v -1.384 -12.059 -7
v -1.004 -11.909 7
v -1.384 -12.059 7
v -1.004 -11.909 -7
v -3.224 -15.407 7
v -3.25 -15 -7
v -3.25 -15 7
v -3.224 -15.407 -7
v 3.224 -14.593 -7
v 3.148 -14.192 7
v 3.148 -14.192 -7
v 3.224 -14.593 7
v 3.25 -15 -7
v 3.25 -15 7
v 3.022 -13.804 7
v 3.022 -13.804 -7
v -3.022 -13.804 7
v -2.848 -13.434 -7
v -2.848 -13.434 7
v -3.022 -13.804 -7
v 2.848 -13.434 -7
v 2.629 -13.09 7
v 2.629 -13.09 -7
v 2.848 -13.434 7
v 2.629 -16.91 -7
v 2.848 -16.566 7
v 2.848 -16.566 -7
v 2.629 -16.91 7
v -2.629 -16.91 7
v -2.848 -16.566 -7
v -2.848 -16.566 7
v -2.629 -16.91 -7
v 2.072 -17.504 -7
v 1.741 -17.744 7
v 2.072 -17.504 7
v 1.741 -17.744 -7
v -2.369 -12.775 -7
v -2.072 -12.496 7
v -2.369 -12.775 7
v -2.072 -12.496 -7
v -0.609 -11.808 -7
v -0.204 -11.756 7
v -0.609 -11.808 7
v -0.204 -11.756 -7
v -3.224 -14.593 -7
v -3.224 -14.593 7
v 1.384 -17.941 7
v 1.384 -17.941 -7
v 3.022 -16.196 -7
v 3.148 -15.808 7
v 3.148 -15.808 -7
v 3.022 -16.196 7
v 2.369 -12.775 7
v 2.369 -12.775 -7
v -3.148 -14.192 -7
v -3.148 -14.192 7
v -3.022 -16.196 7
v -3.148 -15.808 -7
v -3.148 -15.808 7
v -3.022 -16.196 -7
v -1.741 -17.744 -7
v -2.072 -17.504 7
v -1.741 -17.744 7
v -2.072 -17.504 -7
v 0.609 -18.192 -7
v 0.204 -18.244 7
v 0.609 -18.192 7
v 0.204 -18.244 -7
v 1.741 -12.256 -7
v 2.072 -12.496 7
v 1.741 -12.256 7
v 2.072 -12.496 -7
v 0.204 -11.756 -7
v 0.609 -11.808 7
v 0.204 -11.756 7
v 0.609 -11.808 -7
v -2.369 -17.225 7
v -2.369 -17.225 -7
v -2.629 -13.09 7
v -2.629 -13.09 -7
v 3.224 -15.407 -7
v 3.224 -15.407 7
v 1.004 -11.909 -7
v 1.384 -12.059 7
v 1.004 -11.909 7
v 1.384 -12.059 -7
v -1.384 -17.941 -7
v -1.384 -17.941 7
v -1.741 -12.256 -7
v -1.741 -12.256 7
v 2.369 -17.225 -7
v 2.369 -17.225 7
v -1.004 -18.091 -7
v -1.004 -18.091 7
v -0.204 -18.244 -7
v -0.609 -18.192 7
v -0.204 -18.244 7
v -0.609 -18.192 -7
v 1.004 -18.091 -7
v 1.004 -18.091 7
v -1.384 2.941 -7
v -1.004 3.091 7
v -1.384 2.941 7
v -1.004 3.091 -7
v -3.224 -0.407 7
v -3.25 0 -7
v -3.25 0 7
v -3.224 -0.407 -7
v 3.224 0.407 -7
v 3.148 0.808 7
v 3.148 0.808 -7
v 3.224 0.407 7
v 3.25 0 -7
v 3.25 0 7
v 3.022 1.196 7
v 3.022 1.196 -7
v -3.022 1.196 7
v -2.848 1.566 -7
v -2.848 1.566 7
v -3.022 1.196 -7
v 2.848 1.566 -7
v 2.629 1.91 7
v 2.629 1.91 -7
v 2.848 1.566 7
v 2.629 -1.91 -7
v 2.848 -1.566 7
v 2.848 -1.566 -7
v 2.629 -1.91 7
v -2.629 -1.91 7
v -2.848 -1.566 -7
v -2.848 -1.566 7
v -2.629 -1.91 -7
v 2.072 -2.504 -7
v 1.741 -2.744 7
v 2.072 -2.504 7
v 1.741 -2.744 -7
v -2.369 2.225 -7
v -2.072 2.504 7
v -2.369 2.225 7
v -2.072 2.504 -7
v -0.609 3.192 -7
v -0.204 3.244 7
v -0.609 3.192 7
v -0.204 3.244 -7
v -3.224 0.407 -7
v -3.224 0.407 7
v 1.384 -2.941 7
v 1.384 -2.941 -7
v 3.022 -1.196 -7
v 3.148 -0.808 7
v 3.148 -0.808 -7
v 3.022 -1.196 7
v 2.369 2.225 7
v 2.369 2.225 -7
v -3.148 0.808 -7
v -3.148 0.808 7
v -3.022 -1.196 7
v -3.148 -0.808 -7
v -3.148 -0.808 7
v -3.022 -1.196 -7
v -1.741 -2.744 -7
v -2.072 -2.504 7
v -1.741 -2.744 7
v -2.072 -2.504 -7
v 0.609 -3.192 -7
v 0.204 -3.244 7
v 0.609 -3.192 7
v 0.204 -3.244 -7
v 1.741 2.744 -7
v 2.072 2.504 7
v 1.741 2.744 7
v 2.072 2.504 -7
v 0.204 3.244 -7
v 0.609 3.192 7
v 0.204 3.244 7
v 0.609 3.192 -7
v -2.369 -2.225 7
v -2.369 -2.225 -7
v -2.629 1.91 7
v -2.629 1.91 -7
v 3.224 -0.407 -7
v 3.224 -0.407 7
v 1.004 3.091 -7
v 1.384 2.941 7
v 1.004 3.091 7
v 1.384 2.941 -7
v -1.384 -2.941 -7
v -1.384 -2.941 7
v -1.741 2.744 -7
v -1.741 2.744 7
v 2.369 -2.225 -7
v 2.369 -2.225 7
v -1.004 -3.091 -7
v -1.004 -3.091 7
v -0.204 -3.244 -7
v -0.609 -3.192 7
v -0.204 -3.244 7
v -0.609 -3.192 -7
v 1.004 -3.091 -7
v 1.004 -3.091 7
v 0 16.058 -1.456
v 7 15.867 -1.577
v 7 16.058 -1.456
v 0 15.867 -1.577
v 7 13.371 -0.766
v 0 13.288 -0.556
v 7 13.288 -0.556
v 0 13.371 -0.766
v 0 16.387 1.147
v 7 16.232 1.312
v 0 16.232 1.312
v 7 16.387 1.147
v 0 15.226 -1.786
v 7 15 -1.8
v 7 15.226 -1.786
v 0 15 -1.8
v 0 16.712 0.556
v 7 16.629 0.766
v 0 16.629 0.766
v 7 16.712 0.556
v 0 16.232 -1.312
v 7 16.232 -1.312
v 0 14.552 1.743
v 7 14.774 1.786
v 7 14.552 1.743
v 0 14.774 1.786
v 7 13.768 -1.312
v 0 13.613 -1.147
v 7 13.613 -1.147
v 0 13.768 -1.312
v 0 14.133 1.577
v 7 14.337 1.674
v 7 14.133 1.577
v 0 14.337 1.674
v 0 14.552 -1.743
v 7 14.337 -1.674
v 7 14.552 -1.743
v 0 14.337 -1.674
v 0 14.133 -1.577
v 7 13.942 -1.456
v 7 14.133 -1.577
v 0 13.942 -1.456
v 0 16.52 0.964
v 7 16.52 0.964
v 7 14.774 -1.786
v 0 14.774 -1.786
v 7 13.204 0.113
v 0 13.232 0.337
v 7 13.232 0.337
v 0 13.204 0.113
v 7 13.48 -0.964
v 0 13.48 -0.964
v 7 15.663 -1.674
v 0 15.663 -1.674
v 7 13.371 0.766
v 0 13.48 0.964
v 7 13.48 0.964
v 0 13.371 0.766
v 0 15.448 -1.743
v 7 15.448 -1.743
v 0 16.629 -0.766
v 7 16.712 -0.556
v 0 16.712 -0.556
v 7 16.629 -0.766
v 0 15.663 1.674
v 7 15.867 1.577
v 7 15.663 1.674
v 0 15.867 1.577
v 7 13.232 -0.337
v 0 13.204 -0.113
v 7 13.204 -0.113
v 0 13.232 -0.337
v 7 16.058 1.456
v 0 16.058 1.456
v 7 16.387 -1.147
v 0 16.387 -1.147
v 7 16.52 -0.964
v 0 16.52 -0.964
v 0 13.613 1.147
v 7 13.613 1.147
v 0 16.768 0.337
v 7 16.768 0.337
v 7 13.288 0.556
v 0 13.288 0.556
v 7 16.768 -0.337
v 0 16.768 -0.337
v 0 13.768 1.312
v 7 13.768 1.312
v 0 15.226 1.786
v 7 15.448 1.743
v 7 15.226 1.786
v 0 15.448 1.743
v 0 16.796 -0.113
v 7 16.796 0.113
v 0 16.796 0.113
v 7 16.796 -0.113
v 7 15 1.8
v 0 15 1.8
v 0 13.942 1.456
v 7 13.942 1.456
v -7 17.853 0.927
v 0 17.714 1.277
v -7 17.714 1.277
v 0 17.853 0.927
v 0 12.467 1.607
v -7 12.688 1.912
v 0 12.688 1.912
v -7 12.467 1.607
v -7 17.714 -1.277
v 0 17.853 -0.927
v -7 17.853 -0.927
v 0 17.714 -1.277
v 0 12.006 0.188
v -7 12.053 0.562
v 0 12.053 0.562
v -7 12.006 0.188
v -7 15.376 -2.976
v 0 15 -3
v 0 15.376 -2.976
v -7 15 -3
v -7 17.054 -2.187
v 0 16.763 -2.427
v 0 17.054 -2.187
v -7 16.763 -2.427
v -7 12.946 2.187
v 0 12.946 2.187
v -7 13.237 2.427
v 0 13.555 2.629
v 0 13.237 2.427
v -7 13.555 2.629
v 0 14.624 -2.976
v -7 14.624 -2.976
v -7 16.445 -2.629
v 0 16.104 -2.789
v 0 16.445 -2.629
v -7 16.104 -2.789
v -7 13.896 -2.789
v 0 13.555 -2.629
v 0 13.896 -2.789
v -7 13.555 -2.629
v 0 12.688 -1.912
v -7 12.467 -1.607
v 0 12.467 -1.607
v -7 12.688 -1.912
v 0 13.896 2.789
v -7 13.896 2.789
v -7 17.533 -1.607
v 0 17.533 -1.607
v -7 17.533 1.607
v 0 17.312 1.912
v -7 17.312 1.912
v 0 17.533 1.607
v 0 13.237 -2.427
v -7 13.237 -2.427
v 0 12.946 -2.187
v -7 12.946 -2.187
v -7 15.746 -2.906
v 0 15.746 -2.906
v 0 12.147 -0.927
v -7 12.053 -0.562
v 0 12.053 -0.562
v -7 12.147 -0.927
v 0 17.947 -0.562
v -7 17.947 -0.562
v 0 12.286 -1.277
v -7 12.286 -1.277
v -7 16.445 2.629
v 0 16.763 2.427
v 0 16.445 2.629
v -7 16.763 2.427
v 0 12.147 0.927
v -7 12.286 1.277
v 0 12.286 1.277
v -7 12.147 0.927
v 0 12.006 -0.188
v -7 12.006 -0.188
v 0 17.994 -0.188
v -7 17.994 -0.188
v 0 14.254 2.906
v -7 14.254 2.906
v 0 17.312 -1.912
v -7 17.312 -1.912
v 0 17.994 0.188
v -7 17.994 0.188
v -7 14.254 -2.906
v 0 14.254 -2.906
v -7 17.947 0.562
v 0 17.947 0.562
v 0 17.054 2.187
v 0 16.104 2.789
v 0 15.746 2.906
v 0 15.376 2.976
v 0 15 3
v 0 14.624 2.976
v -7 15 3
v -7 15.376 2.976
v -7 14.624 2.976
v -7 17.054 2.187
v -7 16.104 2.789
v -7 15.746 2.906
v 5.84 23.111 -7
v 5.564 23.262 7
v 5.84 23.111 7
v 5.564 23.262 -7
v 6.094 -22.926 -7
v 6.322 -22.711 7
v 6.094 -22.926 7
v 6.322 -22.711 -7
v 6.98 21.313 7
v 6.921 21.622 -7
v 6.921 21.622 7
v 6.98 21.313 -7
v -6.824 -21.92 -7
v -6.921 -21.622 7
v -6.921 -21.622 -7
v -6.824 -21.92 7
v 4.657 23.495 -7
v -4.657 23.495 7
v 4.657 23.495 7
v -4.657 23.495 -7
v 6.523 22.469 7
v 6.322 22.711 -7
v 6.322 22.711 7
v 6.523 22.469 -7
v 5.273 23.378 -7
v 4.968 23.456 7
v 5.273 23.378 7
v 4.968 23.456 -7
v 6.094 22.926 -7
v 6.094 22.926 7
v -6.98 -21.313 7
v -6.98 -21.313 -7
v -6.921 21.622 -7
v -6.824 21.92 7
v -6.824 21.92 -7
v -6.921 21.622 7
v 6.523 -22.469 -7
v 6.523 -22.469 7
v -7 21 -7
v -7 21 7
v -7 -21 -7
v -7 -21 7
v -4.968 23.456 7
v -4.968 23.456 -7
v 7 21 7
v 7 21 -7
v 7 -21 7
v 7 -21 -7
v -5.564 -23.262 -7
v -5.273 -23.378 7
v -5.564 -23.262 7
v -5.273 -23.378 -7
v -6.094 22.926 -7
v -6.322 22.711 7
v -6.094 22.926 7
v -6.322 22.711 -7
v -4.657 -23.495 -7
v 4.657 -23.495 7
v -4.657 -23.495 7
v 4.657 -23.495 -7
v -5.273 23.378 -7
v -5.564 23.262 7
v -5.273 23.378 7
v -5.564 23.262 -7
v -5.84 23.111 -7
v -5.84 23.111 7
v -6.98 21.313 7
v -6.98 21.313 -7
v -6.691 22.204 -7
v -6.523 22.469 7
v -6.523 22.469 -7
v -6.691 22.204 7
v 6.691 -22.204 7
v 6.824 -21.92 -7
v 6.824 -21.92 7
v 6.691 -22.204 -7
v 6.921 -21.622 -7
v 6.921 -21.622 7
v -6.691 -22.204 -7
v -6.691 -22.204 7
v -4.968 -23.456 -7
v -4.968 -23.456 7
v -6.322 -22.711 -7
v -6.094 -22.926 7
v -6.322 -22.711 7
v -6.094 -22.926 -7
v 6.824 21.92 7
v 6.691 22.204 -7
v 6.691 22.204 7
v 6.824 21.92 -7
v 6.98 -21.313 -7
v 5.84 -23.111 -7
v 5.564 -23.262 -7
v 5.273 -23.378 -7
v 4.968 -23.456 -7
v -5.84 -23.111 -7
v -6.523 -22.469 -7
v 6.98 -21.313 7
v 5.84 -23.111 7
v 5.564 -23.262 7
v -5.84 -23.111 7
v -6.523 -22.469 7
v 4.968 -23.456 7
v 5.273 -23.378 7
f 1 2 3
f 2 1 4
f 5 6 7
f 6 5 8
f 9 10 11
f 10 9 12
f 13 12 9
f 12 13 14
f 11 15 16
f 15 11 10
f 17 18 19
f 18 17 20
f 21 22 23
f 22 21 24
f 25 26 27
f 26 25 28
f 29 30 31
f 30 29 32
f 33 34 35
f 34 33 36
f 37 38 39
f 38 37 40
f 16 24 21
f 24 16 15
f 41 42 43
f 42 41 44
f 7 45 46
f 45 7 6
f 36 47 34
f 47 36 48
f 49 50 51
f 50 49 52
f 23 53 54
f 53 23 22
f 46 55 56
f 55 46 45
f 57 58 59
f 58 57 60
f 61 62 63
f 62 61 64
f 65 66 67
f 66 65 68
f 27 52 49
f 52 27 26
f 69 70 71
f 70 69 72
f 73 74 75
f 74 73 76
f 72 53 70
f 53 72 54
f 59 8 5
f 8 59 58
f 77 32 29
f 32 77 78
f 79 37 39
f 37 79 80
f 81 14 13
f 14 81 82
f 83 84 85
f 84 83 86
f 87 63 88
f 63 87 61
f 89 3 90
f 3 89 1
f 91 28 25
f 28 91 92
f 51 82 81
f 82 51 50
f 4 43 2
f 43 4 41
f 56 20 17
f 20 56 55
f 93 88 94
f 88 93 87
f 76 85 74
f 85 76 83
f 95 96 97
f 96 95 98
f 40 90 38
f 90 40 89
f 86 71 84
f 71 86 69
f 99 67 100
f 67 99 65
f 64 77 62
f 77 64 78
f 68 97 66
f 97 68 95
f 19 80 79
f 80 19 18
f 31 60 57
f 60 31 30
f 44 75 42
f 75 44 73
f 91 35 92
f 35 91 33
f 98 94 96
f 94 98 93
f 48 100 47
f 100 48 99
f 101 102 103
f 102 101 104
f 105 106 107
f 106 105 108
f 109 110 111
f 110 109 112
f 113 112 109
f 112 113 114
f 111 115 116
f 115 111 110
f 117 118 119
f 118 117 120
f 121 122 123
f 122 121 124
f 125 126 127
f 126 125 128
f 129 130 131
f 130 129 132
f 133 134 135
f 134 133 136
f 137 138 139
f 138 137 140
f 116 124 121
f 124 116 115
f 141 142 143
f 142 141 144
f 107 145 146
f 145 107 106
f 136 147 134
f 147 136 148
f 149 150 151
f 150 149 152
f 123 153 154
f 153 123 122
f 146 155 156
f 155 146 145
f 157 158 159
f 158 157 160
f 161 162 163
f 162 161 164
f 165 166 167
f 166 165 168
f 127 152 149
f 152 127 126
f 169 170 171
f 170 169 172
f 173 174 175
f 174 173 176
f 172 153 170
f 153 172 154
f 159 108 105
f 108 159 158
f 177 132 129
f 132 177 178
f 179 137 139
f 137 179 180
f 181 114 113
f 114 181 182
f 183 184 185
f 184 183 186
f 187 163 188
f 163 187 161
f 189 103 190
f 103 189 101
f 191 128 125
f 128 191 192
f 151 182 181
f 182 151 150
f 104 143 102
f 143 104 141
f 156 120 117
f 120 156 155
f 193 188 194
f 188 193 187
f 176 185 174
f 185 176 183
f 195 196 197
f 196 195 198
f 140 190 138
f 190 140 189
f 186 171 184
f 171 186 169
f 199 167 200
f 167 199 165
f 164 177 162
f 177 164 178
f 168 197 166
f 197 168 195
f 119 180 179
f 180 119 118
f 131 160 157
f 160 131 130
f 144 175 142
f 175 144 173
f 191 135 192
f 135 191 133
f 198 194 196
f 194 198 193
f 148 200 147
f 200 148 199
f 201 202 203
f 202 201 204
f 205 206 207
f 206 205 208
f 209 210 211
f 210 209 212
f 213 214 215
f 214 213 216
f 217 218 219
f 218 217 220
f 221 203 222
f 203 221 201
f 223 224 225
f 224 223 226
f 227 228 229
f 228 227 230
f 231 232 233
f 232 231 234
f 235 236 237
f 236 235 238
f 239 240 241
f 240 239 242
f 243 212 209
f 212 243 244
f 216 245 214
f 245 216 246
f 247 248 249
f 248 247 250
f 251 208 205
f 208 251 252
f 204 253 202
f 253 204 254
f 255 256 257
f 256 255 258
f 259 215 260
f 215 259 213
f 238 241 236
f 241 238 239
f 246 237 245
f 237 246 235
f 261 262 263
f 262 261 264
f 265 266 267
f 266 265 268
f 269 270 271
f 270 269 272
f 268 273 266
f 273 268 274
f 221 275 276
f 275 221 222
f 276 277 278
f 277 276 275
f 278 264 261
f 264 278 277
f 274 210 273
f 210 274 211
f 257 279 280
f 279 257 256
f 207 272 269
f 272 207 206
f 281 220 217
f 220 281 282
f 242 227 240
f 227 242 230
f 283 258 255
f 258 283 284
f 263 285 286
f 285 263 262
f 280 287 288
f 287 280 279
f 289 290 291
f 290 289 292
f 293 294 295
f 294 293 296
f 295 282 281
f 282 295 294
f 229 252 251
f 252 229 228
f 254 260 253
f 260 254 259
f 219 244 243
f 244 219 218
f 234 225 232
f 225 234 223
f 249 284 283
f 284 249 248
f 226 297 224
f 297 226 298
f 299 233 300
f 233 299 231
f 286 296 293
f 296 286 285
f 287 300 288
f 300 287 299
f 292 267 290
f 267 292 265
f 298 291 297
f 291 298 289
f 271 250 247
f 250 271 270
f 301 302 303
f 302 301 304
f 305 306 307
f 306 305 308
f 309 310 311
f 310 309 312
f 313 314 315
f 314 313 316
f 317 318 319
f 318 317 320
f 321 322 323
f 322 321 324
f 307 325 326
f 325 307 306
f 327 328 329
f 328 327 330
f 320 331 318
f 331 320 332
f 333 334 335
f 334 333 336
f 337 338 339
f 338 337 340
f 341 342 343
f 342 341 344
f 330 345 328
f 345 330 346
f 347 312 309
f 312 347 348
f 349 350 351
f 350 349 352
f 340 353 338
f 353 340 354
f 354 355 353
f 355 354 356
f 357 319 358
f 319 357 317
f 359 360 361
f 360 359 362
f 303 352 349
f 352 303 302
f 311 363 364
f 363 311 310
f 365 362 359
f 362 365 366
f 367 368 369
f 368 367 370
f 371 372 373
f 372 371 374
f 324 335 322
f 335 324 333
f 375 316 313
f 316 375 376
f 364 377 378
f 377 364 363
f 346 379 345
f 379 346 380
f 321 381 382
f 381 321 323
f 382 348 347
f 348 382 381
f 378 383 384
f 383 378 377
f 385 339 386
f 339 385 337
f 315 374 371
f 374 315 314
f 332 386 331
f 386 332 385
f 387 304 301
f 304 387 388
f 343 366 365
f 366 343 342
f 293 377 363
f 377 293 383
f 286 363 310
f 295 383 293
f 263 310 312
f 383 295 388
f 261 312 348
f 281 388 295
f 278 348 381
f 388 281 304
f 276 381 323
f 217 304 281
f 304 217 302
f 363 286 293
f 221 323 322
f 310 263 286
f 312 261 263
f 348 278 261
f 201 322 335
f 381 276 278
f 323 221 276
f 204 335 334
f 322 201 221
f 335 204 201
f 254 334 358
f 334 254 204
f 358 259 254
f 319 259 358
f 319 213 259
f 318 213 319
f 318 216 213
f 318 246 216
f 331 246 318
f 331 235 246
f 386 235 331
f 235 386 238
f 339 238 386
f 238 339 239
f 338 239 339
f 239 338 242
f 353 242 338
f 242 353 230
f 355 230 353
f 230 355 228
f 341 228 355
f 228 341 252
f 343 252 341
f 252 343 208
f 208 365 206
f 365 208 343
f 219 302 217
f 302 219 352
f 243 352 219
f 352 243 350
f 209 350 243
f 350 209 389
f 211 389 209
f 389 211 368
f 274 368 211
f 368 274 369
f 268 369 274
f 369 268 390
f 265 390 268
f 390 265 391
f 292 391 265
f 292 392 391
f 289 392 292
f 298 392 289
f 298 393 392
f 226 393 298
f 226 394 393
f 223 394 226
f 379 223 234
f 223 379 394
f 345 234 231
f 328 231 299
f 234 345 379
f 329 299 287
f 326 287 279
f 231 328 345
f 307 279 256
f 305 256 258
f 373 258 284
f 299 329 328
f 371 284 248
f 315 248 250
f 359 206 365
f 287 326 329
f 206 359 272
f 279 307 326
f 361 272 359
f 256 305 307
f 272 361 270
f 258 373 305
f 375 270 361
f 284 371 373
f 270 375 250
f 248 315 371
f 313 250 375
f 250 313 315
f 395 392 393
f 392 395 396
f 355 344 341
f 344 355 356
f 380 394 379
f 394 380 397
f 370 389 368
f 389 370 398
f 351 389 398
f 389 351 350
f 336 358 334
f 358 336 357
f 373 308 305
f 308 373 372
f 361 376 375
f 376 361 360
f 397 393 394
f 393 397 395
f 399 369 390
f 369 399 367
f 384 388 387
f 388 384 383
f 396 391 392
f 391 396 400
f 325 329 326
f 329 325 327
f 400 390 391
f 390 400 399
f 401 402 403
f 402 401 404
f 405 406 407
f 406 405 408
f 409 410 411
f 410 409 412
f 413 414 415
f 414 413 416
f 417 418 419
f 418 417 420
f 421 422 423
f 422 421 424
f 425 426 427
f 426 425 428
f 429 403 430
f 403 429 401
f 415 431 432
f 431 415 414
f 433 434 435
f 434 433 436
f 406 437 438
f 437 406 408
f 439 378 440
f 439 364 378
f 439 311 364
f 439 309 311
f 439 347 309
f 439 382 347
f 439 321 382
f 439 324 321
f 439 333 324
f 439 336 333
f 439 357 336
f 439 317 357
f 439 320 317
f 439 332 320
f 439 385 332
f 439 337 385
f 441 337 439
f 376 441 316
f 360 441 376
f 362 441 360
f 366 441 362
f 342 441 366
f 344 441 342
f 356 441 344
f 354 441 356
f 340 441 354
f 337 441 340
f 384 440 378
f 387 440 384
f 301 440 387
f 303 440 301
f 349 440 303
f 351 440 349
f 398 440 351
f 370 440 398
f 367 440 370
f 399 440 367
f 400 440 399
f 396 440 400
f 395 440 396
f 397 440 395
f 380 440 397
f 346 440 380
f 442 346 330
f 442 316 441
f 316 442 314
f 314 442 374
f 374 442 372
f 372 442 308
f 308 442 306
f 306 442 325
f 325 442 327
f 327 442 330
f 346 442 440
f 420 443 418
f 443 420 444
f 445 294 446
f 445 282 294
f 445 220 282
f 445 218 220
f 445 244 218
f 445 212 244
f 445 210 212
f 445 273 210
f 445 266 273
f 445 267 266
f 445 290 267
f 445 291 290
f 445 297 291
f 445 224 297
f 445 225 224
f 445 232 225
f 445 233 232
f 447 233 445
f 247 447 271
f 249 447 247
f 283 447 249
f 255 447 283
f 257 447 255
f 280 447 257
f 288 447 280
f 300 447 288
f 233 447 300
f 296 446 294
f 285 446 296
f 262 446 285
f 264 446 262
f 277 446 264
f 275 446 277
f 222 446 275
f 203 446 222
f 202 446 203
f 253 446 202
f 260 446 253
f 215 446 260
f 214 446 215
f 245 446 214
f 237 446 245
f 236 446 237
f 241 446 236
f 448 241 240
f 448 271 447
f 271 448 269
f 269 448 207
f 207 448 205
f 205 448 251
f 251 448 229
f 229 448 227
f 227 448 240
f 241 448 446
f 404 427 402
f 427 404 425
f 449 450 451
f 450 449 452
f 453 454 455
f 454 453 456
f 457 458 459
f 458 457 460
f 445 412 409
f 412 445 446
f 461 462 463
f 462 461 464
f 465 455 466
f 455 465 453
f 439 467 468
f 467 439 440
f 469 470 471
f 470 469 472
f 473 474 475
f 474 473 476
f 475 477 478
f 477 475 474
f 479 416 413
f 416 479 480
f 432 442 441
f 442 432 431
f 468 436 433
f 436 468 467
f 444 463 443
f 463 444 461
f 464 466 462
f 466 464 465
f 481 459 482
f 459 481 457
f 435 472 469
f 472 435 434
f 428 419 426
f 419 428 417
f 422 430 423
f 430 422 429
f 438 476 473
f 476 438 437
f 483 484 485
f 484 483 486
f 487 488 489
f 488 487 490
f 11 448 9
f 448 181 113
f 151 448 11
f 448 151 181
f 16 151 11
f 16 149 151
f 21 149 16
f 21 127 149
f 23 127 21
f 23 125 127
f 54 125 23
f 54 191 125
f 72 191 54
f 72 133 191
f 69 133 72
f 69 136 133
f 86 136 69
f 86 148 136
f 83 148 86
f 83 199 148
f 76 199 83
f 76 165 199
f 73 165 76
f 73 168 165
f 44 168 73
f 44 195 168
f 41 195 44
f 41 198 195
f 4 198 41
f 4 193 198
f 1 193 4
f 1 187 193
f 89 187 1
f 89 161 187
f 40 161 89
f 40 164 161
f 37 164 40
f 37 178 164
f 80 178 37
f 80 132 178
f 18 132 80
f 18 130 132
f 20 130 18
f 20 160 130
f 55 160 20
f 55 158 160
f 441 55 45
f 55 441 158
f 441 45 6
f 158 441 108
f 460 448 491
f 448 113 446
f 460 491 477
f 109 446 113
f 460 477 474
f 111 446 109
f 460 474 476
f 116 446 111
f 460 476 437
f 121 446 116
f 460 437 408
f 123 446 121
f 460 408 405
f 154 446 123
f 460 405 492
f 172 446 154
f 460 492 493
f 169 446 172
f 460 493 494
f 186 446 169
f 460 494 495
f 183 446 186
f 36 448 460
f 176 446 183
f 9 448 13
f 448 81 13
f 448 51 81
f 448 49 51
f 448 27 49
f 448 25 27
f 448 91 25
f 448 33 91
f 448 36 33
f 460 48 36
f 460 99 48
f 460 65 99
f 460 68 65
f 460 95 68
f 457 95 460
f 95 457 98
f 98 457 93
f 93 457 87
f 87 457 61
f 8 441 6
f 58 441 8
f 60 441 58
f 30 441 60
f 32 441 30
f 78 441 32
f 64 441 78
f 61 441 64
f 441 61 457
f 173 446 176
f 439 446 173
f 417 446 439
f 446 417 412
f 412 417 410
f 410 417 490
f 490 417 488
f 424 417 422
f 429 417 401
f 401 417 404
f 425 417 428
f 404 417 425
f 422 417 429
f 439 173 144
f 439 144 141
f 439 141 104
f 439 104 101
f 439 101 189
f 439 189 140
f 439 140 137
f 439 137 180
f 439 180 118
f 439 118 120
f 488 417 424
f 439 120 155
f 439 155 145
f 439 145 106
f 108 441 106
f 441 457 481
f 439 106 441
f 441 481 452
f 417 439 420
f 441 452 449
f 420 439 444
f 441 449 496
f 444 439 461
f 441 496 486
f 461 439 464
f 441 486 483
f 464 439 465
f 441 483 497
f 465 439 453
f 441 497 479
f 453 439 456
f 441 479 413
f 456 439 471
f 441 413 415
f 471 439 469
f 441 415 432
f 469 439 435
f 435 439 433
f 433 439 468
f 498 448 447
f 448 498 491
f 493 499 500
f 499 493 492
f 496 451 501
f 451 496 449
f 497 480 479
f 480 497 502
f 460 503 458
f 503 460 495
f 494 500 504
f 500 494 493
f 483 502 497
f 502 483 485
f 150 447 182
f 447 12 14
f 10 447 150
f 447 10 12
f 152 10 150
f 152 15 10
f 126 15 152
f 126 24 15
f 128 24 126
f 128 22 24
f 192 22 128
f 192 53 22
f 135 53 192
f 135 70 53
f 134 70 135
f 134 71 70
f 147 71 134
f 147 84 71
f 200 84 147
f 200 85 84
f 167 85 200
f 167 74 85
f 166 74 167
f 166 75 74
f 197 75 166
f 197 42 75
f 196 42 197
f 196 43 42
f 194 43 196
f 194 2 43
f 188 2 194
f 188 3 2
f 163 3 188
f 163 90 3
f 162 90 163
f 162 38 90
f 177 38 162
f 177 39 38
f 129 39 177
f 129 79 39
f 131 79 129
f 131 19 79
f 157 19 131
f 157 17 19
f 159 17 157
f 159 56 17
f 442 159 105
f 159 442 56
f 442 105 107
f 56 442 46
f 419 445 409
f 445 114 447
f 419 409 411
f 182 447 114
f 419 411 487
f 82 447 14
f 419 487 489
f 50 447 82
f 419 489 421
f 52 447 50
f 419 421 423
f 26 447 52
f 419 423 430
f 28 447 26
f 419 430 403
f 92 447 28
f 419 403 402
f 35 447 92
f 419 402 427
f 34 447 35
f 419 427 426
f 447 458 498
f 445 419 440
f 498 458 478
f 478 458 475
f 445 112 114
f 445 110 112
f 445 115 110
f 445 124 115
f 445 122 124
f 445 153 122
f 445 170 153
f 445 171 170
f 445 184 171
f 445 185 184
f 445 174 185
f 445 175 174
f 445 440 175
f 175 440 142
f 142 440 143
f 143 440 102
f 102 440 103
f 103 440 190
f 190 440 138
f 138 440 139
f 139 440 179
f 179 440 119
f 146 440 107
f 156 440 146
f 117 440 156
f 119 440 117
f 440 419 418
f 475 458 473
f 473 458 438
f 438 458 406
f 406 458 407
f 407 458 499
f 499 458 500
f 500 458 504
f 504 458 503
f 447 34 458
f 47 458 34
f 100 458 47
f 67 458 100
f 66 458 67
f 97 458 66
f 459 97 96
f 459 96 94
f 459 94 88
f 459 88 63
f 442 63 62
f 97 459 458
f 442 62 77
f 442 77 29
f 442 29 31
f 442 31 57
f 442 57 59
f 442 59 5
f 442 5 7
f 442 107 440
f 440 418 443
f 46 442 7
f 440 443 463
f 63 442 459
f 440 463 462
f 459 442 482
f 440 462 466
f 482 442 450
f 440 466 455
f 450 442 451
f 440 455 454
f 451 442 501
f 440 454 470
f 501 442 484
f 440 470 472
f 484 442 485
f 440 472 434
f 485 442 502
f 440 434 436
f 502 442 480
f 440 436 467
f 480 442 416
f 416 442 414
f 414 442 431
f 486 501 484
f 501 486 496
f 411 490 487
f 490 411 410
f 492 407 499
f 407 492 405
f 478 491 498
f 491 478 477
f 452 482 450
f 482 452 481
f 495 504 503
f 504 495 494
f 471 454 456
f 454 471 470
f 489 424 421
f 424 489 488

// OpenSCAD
$fn = 50;


difference() {
	union() {
		translate(v = [0, 0, -7.0000000000]) {
			hull() {
				translate(v = [-4.5000000000, 21.0000000000, 0]) {
					cylinder(h = 14, r = 2.5000000000);
				}
				translate(v = [4.5000000000, 21.0000000000, 0]) {
					cylinder(h = 14, r = 2.5000000000);
				}
				translate(v = [-4.5000000000, -21.0000000000, 0]) {
					cylinder(h = 14, r = 2.5000000000);
				}
				translate(v = [4.5000000000, -21.0000000000, 0]) {
					cylinder(h = 14, r = 2.5000000000);
				}
			}
		}
	}
	union() {
		translate(v = [0.0000000000, -15.0000000000, -50.0000000000]) {
			cylinder(h = 100, r = 3.2500000000);
		}
		translate(v = [0.0000000000, 0.0000000000, -50.0000000000]) {
			cylinder(h = 100, r = 3.2500000000);
		}
		translate(v = [-50, 15, 0]) {
			rotate(a = [0, 90, 0]) {
				cylinder(h = 100, r = 1.8000000000);
			}
		}
		translate(v = [-100, 15, 0]) {
			rotate(a = [0, 90, 0]) {
				cylinder(h = 100, r = 3.0000000000);
			}
		}
	}
}
